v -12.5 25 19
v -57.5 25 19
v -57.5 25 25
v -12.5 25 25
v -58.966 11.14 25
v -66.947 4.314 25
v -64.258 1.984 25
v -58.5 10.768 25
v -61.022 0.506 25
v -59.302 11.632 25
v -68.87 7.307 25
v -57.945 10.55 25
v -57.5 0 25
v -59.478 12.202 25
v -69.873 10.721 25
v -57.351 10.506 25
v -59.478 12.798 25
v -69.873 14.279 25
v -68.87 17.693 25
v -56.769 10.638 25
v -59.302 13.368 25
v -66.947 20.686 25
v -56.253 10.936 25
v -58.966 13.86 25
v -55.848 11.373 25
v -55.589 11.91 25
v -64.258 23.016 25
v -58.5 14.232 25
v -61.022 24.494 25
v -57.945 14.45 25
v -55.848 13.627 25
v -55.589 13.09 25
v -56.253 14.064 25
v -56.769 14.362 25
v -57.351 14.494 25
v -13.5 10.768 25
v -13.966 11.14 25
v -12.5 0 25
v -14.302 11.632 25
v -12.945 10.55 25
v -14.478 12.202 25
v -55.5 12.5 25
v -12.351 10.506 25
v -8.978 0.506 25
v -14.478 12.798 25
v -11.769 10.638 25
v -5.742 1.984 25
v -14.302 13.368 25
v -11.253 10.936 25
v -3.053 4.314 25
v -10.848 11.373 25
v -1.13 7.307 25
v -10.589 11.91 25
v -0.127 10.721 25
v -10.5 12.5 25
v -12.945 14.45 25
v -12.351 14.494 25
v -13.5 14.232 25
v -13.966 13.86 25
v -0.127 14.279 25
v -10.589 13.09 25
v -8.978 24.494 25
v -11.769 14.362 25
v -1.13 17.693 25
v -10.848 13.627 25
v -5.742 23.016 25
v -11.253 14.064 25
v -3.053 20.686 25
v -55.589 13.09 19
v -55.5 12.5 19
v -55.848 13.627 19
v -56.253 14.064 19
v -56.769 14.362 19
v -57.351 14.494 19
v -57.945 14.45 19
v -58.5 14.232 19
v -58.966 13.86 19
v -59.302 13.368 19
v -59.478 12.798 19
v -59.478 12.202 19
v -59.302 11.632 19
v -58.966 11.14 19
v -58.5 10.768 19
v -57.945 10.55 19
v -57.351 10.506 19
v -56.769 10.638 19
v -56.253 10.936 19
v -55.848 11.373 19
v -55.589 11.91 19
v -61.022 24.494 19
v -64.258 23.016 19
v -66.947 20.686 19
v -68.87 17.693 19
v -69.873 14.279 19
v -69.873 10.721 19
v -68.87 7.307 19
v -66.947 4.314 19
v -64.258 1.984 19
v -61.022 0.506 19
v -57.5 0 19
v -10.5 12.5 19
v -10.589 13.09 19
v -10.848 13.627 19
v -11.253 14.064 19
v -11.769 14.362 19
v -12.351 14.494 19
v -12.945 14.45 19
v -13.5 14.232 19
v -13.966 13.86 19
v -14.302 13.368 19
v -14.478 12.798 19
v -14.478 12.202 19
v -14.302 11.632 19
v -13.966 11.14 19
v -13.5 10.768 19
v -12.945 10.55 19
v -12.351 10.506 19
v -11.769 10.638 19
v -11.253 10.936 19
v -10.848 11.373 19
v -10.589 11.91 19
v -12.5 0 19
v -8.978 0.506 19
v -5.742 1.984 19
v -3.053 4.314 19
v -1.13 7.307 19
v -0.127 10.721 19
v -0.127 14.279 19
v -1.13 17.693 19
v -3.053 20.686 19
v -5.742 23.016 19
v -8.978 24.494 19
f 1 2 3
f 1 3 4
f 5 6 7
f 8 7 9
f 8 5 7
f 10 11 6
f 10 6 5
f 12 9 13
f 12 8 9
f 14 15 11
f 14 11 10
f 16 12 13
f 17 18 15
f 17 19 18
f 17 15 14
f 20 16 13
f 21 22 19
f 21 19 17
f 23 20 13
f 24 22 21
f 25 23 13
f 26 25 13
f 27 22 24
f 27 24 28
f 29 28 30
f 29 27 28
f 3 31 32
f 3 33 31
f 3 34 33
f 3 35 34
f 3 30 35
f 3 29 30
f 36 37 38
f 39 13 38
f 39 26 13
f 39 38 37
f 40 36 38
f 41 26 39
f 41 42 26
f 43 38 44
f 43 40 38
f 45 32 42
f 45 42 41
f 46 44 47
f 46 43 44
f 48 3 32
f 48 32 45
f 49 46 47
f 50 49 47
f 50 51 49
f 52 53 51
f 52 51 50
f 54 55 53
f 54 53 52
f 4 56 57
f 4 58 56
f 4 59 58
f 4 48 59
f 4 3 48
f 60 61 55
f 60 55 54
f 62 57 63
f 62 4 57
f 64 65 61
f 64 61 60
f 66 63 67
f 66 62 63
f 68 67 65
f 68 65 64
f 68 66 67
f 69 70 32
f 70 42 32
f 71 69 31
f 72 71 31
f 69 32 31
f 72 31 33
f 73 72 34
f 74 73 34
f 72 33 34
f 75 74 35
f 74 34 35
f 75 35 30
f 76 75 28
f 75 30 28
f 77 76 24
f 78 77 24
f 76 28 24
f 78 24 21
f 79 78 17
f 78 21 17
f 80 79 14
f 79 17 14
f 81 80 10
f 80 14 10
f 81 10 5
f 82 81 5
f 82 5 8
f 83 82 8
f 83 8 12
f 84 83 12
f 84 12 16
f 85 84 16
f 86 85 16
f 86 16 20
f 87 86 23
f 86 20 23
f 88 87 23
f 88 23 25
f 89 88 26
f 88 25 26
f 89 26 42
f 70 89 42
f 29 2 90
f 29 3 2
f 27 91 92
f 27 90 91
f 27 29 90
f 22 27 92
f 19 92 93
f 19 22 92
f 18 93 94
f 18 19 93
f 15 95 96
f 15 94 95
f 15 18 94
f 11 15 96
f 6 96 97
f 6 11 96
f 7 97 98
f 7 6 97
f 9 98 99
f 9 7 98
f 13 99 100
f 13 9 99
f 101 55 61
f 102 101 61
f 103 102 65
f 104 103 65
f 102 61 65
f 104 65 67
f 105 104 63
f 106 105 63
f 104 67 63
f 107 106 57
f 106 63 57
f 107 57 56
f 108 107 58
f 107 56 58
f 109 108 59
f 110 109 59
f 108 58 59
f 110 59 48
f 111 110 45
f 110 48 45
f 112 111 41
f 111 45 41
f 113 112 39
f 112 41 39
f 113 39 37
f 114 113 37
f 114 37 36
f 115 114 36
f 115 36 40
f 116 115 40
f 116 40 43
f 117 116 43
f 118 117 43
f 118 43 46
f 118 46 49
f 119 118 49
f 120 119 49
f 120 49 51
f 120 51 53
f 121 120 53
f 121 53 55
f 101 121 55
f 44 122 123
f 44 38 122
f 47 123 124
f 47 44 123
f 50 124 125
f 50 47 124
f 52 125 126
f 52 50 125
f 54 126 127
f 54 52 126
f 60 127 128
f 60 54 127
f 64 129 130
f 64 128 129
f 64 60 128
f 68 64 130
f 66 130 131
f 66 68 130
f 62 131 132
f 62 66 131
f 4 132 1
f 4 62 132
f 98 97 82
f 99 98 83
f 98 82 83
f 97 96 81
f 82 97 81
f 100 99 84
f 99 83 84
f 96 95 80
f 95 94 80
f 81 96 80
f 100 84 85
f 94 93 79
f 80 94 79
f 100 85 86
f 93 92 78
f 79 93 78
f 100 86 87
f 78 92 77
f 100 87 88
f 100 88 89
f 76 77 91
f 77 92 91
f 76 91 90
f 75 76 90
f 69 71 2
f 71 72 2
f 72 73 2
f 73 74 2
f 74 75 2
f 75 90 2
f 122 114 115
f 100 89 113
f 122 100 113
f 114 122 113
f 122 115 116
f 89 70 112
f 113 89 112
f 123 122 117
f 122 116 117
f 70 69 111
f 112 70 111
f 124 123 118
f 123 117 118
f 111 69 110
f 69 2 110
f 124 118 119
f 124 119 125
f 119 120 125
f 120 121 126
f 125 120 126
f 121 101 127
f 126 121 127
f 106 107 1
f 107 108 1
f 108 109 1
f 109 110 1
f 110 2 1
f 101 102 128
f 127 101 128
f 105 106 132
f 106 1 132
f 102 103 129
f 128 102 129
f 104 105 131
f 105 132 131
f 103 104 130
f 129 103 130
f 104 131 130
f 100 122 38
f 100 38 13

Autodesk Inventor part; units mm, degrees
ref_plane "YZ Plane" through (0, 0, 0) normal (1, 0, 0) x (0, 1, 0)
ref_plane "XZ Plane" through (0, 0, 0) normal (0, 1, 0) x (-1, 0, 0)
ref_plane "XY Plane" through (0, 0, 0) normal (0, 0, 1) x (1, 0, 0)
sketch "Sketch1" plane through (0, 0, 0) normal (0, 0, 1) x (1, 0, 0)
  line L0 (0, 0) -> (-70, 0)
  line L1 (-70, 0) -> (-70, 25)
  line L2 (-70, 25) -> (0, 25)
  line L3 (0, 25) -> (0, 0)
  dimension "d0" = 25
  dimension "d1" = 70
extrude "Extrusion1" add sketch "Sketch1" along normal blind 25
sketch "Sketch3" plane through (0, 0, 25) normal (0, 0, 1) x (1, 0, 0)
  line L0 (0, 0) -> (0, 25) projected
  line L1 (-70, 0) -> (0, 0) projected
  circle A0 centre (-12.5, 12.5) radius 12.5 projected
  circle A1 centre (-57.5, 12.5) radius 12.5 projected
  line L2 (-70, 25) -> (-70, 0) projected
  circle A2 centre (-57.5, 12.5) radius 2 projected
  circle A3 centre (-12.5, 12.5) radius 2 projected
  line L3 (0, 25) -> (-70, 25) projected
  point P0 (-12.5, 25)
  point P1 (0, 12.5)
  point P2 (-12.5, 0)
  point P3 (-57.5, 25)
  point P4 (-70, 12.5)
  point P5 (-57.5, 0)
extrude "Extrusion2" cut sketch "Sketch3" against normal blind 25 contours L1 A0 L0 | A0 L3 L0 | L1 L2 A1 | A1 L2 L3 | A2 | A3
sketch "Sketch4" plane through (-57.5, 25, 0) normal (0, 1, 0) x (1, 0, 0)
  line L0 (-12.5, 0) -> (-12.5, -25) projected
  line L1 (57.5, 0) -> (-12.5, 0)
  line L2 (-12.5, 0) -> (-12.5, -19)
  line L3 (-12.5, -19) -> (57.5, -19)
  line L4 (57.5, -19) -> (57.5, 0)
  dimension "d14" = 19
extrude "Extrusion3" cut sketch "Sketch4" against normal blind 100
sketch "Sketch5" plane through (0, 0, 25) normal (0, 0, 1) x (1, 0, 0)
  point P0 (0, 0)
properties part number "Small Rod"
